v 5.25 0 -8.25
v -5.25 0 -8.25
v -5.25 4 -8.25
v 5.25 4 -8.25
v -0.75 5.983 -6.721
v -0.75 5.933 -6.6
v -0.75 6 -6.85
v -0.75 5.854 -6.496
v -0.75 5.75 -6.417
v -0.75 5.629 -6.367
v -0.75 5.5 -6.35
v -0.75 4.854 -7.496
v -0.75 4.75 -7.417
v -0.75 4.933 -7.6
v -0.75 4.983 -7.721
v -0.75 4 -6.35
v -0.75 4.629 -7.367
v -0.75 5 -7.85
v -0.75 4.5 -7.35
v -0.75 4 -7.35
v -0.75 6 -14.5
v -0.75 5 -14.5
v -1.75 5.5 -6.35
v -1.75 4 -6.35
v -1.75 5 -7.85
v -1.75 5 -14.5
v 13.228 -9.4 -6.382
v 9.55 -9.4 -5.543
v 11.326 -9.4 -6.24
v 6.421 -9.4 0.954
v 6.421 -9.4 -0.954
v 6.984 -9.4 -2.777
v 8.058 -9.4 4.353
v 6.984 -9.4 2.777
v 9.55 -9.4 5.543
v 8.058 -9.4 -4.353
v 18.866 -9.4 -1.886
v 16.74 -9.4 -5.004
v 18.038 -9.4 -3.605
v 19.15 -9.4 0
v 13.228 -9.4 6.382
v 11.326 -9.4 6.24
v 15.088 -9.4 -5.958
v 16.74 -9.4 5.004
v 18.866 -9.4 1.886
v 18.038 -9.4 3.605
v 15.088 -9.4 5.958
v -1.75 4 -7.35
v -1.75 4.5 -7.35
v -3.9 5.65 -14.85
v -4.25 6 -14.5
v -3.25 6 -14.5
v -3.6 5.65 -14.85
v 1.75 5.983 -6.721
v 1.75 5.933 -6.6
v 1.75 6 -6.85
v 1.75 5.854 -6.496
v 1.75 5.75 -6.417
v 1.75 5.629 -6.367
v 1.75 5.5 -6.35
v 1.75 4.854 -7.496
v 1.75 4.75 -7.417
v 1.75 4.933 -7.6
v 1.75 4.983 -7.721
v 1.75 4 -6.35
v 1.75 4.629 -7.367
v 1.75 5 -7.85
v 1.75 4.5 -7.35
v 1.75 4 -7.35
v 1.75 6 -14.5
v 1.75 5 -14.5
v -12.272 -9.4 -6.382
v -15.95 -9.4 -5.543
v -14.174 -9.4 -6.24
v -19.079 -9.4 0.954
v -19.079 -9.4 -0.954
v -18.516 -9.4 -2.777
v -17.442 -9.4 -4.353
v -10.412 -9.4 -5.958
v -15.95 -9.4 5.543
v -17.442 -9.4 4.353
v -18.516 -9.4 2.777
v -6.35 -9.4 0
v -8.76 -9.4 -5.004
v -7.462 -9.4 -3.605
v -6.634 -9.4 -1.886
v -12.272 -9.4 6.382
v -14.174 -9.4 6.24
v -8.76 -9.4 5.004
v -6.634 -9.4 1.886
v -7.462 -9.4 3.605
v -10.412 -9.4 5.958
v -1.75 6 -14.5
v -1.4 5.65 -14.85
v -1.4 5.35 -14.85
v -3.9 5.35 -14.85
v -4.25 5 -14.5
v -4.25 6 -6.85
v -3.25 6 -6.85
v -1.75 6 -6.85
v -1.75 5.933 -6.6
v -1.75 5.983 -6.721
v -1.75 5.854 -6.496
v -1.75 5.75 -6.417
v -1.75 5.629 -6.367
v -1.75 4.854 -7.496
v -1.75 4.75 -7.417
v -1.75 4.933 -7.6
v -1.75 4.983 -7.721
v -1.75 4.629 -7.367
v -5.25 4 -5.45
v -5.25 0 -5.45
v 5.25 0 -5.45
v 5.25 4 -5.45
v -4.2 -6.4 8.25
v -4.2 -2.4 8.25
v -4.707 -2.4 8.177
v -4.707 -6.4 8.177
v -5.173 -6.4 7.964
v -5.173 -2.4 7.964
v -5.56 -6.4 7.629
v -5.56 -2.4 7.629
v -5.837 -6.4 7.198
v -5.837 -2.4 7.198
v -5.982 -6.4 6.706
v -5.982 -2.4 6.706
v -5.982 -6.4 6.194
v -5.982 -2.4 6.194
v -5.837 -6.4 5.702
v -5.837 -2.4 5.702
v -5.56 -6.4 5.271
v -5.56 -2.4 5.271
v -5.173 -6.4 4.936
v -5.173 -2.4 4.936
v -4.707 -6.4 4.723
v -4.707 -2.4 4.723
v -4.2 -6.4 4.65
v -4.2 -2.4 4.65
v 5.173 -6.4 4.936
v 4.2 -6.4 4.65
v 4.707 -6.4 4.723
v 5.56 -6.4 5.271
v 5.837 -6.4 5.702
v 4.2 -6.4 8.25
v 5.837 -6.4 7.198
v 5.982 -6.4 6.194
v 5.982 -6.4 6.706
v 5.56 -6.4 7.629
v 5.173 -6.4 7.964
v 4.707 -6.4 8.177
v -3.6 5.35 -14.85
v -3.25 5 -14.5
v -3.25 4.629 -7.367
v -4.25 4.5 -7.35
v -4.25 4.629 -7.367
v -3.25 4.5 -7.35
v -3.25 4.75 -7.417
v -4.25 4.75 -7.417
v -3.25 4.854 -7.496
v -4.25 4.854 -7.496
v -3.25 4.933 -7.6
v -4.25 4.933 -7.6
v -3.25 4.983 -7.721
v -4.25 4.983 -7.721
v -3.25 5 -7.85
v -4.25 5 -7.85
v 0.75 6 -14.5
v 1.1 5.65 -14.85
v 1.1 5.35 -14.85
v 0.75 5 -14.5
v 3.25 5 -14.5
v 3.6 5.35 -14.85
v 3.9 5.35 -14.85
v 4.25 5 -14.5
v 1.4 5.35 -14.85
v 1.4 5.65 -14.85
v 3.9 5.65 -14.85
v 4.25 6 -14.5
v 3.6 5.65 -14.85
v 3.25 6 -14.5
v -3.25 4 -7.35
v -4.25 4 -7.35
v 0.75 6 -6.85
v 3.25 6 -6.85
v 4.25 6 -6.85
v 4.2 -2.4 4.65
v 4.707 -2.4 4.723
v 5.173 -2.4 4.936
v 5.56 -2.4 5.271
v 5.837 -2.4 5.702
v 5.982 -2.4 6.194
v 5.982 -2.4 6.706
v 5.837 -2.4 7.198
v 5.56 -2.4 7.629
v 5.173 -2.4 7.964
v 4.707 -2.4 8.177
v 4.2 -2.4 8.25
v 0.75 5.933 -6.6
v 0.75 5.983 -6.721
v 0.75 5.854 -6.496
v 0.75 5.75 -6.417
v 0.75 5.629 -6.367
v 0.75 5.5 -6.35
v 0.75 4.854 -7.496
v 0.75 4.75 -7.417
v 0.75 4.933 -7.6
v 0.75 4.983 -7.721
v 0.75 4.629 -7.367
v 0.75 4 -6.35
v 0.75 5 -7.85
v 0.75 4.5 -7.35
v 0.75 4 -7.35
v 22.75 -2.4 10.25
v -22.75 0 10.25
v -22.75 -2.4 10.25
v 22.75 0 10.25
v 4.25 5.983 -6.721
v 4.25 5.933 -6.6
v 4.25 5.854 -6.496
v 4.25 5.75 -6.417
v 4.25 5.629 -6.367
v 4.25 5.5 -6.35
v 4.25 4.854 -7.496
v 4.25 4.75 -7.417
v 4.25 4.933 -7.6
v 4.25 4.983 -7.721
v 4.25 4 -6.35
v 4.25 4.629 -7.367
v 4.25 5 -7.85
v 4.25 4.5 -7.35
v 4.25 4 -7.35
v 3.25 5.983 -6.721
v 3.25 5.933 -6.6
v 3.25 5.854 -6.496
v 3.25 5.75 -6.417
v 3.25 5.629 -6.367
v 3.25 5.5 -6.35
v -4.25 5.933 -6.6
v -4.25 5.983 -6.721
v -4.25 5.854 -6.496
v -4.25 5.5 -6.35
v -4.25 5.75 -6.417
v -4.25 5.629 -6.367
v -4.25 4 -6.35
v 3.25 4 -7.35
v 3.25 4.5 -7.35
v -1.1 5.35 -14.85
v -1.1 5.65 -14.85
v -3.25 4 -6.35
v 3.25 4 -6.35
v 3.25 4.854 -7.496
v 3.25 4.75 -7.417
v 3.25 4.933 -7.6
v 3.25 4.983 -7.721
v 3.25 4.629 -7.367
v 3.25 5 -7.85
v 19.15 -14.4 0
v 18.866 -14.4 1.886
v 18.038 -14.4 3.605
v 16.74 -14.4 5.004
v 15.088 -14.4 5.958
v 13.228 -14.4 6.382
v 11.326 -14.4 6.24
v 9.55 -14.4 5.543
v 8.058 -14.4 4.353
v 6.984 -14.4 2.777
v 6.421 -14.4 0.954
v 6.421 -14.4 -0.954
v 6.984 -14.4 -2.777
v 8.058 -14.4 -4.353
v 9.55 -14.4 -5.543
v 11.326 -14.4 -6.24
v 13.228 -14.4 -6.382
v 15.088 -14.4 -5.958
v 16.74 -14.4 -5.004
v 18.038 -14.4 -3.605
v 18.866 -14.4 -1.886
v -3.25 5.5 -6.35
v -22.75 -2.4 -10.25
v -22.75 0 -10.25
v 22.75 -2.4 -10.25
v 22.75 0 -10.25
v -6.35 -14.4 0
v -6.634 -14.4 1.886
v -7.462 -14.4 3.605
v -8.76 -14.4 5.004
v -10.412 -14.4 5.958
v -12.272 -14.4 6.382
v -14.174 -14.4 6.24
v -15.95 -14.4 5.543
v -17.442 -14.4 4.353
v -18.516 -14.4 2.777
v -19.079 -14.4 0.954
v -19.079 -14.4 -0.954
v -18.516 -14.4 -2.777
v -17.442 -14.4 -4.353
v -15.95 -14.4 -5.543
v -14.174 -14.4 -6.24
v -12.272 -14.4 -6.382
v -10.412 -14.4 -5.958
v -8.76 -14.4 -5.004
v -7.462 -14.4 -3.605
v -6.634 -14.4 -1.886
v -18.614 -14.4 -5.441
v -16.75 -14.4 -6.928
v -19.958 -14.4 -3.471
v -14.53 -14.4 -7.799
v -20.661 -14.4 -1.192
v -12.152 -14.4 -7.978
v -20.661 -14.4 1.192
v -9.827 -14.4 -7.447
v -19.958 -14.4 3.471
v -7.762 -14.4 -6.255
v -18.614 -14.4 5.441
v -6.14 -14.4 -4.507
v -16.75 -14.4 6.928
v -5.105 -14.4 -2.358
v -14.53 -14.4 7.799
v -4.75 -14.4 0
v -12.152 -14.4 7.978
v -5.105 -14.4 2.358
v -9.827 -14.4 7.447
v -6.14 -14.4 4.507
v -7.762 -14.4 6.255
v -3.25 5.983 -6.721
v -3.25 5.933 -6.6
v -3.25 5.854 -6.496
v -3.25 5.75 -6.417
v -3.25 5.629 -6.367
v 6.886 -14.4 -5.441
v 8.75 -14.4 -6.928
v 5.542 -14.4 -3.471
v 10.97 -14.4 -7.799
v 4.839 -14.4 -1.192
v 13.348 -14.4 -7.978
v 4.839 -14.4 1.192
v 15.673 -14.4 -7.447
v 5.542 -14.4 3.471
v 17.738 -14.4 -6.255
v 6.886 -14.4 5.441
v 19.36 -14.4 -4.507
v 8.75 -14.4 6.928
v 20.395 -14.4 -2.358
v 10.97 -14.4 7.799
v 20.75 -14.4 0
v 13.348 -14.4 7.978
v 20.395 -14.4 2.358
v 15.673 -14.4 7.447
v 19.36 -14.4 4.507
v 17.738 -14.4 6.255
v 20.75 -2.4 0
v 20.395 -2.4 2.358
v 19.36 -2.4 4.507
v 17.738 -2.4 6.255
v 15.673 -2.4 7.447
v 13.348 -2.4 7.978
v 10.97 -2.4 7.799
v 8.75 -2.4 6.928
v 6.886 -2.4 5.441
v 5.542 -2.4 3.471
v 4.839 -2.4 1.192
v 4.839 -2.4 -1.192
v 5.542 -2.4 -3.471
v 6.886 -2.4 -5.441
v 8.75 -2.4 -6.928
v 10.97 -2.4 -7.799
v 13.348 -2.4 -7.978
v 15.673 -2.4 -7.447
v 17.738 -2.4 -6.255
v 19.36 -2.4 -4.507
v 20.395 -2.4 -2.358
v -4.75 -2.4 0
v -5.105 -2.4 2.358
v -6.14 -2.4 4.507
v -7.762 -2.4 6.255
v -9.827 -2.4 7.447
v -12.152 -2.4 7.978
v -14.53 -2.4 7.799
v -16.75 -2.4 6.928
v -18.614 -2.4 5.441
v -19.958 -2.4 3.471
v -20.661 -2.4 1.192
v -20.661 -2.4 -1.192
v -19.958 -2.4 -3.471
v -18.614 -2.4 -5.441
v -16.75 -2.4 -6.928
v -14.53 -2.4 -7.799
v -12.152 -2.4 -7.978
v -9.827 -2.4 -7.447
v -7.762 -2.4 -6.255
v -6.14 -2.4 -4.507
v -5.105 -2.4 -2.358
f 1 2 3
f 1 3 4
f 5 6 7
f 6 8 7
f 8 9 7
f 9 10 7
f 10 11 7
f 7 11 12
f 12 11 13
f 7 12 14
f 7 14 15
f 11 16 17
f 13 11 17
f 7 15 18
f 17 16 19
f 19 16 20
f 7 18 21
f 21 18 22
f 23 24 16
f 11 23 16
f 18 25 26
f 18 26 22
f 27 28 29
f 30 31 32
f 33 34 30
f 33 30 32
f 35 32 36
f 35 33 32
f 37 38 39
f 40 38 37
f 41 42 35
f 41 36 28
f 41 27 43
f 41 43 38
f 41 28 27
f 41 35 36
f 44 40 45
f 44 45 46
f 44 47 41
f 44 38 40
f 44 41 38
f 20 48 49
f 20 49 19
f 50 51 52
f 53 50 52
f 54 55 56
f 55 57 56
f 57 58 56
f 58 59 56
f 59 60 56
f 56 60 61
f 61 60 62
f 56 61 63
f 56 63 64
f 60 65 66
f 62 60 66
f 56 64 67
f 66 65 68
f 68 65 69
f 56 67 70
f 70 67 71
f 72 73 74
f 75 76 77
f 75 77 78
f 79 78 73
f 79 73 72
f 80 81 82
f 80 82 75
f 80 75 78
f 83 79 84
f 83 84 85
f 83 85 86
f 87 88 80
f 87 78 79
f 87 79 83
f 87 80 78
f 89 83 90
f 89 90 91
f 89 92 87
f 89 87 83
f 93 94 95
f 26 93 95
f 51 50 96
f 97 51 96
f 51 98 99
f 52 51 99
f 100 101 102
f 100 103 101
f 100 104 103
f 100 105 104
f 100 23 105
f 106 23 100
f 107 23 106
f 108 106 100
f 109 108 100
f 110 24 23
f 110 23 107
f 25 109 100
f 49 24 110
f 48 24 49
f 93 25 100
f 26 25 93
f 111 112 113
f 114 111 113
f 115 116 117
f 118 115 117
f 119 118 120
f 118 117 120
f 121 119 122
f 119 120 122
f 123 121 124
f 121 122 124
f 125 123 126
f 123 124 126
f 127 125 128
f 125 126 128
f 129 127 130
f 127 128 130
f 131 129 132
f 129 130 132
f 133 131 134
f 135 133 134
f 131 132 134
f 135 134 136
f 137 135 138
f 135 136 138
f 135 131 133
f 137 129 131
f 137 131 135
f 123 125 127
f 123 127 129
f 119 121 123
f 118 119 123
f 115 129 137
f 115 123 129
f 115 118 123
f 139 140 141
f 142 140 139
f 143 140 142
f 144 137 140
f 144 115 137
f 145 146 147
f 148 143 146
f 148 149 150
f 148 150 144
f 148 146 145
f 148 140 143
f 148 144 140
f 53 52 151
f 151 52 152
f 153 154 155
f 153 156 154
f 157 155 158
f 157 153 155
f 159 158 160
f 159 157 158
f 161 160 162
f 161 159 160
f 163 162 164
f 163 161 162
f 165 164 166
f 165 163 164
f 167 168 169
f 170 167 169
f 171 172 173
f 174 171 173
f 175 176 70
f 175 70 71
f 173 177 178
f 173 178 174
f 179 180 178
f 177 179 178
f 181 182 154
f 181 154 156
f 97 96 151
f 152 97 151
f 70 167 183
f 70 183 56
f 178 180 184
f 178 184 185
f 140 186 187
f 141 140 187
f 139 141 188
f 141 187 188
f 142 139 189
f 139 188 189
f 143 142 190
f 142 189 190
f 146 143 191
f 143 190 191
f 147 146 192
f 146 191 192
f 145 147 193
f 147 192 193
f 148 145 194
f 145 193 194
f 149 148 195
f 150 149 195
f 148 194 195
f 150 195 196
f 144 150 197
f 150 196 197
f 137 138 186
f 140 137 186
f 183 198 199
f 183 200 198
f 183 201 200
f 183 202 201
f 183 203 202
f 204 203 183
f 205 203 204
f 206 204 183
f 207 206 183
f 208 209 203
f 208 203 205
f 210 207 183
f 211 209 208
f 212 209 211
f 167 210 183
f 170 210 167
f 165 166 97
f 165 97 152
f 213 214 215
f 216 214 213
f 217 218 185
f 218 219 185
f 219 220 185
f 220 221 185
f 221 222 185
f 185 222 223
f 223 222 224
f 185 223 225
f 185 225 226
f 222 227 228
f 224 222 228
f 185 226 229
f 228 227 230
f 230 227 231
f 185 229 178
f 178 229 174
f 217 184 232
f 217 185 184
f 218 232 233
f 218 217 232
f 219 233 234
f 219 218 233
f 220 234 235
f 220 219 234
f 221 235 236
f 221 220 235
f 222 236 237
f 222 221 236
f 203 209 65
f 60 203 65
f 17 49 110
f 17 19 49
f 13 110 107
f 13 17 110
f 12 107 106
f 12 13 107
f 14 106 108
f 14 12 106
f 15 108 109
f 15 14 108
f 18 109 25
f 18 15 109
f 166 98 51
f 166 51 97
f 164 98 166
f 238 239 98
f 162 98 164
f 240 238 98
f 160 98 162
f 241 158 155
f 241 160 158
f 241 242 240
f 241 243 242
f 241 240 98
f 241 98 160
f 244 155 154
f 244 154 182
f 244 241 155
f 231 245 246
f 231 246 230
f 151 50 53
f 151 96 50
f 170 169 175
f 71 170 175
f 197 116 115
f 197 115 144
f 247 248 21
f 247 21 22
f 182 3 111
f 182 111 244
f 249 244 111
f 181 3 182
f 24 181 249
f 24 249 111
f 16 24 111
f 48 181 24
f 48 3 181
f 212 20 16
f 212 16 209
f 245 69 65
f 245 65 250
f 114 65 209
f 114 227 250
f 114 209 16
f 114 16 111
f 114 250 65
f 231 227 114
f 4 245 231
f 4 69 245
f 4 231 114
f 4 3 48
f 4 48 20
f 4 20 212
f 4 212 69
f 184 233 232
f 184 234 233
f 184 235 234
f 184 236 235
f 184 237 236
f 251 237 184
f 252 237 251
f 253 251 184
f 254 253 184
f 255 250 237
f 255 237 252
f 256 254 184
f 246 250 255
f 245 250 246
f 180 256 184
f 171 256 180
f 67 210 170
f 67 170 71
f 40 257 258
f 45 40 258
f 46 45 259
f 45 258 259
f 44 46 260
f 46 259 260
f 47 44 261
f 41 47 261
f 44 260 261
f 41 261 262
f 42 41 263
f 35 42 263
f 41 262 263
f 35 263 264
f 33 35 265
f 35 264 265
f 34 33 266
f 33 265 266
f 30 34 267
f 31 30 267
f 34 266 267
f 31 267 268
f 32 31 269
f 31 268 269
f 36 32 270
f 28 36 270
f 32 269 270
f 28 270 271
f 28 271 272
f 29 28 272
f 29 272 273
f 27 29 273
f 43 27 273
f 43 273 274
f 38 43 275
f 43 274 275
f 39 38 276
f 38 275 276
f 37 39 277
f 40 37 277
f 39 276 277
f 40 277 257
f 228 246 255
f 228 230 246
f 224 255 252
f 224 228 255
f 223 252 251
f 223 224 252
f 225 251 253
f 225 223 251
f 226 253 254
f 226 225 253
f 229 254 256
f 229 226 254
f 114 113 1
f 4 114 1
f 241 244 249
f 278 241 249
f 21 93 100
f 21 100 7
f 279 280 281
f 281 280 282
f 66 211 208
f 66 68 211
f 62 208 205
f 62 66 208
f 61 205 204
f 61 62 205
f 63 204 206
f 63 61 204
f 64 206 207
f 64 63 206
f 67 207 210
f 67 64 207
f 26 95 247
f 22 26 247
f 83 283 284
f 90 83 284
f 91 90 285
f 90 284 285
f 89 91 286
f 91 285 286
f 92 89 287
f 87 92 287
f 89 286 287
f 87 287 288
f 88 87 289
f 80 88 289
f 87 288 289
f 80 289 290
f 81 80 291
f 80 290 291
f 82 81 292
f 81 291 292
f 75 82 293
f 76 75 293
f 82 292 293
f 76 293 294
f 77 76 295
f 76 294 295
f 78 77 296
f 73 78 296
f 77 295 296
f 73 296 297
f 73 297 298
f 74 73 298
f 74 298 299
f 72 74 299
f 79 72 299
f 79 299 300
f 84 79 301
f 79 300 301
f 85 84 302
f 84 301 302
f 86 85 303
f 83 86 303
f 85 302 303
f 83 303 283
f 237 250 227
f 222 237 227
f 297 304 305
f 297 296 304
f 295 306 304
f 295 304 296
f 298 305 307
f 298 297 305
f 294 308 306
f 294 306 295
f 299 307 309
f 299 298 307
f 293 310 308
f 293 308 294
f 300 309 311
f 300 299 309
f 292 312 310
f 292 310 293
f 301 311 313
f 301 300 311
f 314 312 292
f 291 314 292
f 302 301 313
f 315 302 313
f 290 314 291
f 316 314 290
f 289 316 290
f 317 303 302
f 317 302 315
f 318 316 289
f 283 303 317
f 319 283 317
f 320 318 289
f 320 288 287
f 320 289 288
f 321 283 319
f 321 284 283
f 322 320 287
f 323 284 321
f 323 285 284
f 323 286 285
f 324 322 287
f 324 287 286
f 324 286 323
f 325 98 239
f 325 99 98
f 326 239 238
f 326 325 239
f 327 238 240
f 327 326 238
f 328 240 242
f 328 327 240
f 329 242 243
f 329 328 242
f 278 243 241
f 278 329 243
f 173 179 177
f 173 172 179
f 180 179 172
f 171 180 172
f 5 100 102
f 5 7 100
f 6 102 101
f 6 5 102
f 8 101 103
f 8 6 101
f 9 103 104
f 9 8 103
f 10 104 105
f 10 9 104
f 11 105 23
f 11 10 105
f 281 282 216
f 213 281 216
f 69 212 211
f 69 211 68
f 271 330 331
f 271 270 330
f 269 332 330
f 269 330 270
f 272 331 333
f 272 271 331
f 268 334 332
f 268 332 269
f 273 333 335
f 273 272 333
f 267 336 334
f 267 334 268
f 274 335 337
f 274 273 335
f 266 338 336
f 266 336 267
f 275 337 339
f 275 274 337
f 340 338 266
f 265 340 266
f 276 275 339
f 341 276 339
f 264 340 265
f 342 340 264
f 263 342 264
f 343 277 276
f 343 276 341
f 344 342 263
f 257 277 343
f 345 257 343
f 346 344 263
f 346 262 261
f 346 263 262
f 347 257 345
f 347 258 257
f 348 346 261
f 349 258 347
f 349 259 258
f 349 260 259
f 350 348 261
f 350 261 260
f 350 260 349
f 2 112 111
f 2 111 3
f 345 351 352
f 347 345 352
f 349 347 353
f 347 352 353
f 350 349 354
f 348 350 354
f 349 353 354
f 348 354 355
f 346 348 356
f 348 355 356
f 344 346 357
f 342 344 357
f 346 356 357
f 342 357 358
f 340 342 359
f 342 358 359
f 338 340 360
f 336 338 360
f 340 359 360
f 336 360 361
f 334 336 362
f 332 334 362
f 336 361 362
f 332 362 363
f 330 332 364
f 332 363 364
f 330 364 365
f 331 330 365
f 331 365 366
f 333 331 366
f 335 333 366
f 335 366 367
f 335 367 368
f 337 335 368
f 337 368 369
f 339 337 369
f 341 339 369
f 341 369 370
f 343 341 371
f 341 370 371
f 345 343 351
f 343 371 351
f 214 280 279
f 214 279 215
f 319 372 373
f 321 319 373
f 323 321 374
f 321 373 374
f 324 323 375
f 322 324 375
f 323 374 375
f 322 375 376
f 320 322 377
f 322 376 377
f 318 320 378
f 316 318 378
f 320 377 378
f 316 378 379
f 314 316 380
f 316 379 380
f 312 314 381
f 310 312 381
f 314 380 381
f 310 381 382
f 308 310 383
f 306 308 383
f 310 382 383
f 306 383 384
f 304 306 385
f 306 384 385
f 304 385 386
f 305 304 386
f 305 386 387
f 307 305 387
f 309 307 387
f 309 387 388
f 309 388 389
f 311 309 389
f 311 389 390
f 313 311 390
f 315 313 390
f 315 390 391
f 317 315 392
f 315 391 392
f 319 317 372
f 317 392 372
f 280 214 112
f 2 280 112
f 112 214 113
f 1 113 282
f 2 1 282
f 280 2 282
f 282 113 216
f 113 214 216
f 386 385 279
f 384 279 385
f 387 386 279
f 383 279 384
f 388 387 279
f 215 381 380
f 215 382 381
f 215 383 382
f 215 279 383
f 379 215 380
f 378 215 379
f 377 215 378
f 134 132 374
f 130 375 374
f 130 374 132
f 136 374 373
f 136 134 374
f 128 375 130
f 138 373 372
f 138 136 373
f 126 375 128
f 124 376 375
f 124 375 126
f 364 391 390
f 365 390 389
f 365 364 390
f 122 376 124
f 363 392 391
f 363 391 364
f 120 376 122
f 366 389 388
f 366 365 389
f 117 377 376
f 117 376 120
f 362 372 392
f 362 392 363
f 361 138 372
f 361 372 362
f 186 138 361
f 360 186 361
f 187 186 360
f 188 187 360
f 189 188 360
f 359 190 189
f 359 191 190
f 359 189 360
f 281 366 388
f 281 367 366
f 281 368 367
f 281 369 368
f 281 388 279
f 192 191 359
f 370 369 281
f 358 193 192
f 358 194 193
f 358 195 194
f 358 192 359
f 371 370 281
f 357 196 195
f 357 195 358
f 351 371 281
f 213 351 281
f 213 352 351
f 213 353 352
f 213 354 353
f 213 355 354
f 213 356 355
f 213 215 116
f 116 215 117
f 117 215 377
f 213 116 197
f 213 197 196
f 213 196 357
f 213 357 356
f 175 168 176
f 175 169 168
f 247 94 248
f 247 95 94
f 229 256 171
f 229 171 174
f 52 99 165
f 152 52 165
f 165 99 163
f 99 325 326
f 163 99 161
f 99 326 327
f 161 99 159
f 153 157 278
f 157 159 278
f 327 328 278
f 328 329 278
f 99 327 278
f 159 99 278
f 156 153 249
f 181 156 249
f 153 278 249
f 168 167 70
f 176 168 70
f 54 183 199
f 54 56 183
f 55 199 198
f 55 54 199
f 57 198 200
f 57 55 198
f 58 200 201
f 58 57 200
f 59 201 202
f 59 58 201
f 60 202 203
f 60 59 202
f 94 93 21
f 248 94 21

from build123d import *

# Parameters (mm, degrees)
SKETCH_W     = 45.5
SKETCH_H     = 20.5
PAD_DEPTH    = 2.4
SKETCH001_R  = 8
PAD001_DEPTH = 12
SKETCH002_R  = 6.4
POCKET_DEPTH = 5
PAD002_DEPTH = 4
SKETCH004_W  = 10.5
SKETCH004_H  = 2.8
PAD003_DEPTH = 4
SKETCH005_W  = 1
SKETCH005_H  = 1
PAD004_DEPTH = 2
SKETCH006_W  = 1
SKETCH006_H  = 1
PAD005_DEPTH = 7.5
FILLET_R     = 0.5
FILLET001_R  = 0.5
CHAMFER_SIZE = 0.35


with BuildPart() as part:
    # Sketch → Pad (new body)
    with BuildSketch(Plane.XZ):
        Rectangle(SKETCH_W, SKETCH_H)
    extrude(amount=PAD_DEPTH)

    # Sketch001 → Pad001 (new body)
    with BuildSketch(Plane.XZ.offset(2.4)):
        with Locations((-12.75, 0)):
            Circle(SKETCH001_R)
        with Locations((12.75, 0)):
            Circle(SKETCH001_R)
    extrude(amount=PAD001_DEPTH)

    # Sketch002 → Pocket (cut)
    with BuildSketch(Plane.XZ.offset(14.4)):
        with Locations((-12.75, 0)):
            Circle(SKETCH002_R)
        with Locations((12.75, 0)):
            Circle(SKETCH002_R)
    extrude(amount=-POCKET_DEPTH, mode=Mode.SUBTRACT)

    # Sketch003 → Pad002 (new body)
    with BuildSketch(Plane.XZ.offset(2.4)):
        with BuildLine():
            ThreePointArc((-4.2, 8.25), (-6, 6.45), (-4.2, 4.65))
            Line((-4.2, 4.65), (4.2, 4.65))
            ThreePointArc((4.2, 4.65), (6, 6.45), (4.2, 8.25))
            Line((-4.2, 8.25), (4.2, 8.25))
        make_face()
    extrude(amount=PAD002_DEPTH)

    # Sketch004 → Pad003 (new body)
    with BuildSketch(Plane(origin=(0, 0, 0), x_dir=(1, 0, 0), z_dir=(0, 1, 0))):
        with Locations((0, 6.85)):
            Rectangle(SKETCH004_W, SKETCH004_H)
    extrude(amount=PAD003_DEPTH)

    # Sketch005 → Pad004 (new body)
    with BuildSketch(Plane(origin=(0, 4, 0), x_dir=(1, 0, 0), z_dir=(0, 1, 0))):
        with Locations((-3.75, 6.85)):
            Rectangle(SKETCH005_W, SKETCH005_H)
        with Locations((-1.25, 6.85)):
            Rectangle(SKETCH005_W, SKETCH005_H)
        with Locations((1.25, 6.85)):
            Rectangle(SKETCH005_W, SKETCH005_H)
        with Locations((3.75, 6.85)):
            Rectangle(SKETCH005_W, SKETCH005_H)
    extrude(amount=PAD004_DEPTH)

    # Sketch006 → Pad005 (new body)
    with BuildSketch(Plane(origin=(0, 0, -7.35), x_dir=(1, 0, 0), z_dir=(0, 0, -1))):
        with Locations((-3.75, -5.5)):
            Rectangle(SKETCH006_W, SKETCH006_H)
        with Locations((-1.25, -5.5)):
            Rectangle(SKETCH006_W, SKETCH006_H)
        with Locations((1.25, -5.5)):
            Rectangle(SKETCH006_W, SKETCH006_H)
        with Locations((3.75, -5.5)):
            Rectangle(SKETCH006_W, SKETCH006_H)
    extrude(amount=PAD005_DEPTH)

    # Fillet
    fillet_edges = [part.edges().sort_by_distance(p)[0] for p in [
        (-3.75, 6, -6.35),
        (-1.25, 6, -6.35),
        (1.25, 6, -6.35),
        (3.75, 6, -6.35),
    ]]
    fillet(fillet_edges, radius=FILLET_R)

    # Fillet001
    fillet001_edges = [part.edges().sort_by_distance(p)[0] for p in [
        (3.75, 5, -7.35),
        (1.25, 5, -7.35),
        (-1.25, 5, -7.35),
        (-3.75, 5, -7.35),
    ]]
    fillet(fillet001_edges, radius=FILLET001_R)

    # Chamfer
    chamfer_edges = [part.edges().sort_by_distance(p)[0] for p in [
        (-3.75, 6, -14.85),
        (-4.25, 5.5, -14.85),
        (-3.75, 5, -14.85),
        (-3.25, 5.5, -14.85),
        (-1.25, 6, -14.85),
        (-1.75, 5.5, -14.85),
        (-1.25, 5, -14.85),
        (-0.75, 5.5, -14.85),
        (1.25, 6, -14.85),
        (0.75, 5.5, -14.85),
        (1.25, 5, -14.85),
        (1.75, 5.5, -14.85),
        (3.75, 6, -14.85),
        (3.25, 5.5, -14.85),
        (3.75, 5, -14.85),
        (4.25, 5.5, -14.85),
    ]]
    chamfer(chamfer_edges, length=CHAMFER_SIZE)


solid = part.part
